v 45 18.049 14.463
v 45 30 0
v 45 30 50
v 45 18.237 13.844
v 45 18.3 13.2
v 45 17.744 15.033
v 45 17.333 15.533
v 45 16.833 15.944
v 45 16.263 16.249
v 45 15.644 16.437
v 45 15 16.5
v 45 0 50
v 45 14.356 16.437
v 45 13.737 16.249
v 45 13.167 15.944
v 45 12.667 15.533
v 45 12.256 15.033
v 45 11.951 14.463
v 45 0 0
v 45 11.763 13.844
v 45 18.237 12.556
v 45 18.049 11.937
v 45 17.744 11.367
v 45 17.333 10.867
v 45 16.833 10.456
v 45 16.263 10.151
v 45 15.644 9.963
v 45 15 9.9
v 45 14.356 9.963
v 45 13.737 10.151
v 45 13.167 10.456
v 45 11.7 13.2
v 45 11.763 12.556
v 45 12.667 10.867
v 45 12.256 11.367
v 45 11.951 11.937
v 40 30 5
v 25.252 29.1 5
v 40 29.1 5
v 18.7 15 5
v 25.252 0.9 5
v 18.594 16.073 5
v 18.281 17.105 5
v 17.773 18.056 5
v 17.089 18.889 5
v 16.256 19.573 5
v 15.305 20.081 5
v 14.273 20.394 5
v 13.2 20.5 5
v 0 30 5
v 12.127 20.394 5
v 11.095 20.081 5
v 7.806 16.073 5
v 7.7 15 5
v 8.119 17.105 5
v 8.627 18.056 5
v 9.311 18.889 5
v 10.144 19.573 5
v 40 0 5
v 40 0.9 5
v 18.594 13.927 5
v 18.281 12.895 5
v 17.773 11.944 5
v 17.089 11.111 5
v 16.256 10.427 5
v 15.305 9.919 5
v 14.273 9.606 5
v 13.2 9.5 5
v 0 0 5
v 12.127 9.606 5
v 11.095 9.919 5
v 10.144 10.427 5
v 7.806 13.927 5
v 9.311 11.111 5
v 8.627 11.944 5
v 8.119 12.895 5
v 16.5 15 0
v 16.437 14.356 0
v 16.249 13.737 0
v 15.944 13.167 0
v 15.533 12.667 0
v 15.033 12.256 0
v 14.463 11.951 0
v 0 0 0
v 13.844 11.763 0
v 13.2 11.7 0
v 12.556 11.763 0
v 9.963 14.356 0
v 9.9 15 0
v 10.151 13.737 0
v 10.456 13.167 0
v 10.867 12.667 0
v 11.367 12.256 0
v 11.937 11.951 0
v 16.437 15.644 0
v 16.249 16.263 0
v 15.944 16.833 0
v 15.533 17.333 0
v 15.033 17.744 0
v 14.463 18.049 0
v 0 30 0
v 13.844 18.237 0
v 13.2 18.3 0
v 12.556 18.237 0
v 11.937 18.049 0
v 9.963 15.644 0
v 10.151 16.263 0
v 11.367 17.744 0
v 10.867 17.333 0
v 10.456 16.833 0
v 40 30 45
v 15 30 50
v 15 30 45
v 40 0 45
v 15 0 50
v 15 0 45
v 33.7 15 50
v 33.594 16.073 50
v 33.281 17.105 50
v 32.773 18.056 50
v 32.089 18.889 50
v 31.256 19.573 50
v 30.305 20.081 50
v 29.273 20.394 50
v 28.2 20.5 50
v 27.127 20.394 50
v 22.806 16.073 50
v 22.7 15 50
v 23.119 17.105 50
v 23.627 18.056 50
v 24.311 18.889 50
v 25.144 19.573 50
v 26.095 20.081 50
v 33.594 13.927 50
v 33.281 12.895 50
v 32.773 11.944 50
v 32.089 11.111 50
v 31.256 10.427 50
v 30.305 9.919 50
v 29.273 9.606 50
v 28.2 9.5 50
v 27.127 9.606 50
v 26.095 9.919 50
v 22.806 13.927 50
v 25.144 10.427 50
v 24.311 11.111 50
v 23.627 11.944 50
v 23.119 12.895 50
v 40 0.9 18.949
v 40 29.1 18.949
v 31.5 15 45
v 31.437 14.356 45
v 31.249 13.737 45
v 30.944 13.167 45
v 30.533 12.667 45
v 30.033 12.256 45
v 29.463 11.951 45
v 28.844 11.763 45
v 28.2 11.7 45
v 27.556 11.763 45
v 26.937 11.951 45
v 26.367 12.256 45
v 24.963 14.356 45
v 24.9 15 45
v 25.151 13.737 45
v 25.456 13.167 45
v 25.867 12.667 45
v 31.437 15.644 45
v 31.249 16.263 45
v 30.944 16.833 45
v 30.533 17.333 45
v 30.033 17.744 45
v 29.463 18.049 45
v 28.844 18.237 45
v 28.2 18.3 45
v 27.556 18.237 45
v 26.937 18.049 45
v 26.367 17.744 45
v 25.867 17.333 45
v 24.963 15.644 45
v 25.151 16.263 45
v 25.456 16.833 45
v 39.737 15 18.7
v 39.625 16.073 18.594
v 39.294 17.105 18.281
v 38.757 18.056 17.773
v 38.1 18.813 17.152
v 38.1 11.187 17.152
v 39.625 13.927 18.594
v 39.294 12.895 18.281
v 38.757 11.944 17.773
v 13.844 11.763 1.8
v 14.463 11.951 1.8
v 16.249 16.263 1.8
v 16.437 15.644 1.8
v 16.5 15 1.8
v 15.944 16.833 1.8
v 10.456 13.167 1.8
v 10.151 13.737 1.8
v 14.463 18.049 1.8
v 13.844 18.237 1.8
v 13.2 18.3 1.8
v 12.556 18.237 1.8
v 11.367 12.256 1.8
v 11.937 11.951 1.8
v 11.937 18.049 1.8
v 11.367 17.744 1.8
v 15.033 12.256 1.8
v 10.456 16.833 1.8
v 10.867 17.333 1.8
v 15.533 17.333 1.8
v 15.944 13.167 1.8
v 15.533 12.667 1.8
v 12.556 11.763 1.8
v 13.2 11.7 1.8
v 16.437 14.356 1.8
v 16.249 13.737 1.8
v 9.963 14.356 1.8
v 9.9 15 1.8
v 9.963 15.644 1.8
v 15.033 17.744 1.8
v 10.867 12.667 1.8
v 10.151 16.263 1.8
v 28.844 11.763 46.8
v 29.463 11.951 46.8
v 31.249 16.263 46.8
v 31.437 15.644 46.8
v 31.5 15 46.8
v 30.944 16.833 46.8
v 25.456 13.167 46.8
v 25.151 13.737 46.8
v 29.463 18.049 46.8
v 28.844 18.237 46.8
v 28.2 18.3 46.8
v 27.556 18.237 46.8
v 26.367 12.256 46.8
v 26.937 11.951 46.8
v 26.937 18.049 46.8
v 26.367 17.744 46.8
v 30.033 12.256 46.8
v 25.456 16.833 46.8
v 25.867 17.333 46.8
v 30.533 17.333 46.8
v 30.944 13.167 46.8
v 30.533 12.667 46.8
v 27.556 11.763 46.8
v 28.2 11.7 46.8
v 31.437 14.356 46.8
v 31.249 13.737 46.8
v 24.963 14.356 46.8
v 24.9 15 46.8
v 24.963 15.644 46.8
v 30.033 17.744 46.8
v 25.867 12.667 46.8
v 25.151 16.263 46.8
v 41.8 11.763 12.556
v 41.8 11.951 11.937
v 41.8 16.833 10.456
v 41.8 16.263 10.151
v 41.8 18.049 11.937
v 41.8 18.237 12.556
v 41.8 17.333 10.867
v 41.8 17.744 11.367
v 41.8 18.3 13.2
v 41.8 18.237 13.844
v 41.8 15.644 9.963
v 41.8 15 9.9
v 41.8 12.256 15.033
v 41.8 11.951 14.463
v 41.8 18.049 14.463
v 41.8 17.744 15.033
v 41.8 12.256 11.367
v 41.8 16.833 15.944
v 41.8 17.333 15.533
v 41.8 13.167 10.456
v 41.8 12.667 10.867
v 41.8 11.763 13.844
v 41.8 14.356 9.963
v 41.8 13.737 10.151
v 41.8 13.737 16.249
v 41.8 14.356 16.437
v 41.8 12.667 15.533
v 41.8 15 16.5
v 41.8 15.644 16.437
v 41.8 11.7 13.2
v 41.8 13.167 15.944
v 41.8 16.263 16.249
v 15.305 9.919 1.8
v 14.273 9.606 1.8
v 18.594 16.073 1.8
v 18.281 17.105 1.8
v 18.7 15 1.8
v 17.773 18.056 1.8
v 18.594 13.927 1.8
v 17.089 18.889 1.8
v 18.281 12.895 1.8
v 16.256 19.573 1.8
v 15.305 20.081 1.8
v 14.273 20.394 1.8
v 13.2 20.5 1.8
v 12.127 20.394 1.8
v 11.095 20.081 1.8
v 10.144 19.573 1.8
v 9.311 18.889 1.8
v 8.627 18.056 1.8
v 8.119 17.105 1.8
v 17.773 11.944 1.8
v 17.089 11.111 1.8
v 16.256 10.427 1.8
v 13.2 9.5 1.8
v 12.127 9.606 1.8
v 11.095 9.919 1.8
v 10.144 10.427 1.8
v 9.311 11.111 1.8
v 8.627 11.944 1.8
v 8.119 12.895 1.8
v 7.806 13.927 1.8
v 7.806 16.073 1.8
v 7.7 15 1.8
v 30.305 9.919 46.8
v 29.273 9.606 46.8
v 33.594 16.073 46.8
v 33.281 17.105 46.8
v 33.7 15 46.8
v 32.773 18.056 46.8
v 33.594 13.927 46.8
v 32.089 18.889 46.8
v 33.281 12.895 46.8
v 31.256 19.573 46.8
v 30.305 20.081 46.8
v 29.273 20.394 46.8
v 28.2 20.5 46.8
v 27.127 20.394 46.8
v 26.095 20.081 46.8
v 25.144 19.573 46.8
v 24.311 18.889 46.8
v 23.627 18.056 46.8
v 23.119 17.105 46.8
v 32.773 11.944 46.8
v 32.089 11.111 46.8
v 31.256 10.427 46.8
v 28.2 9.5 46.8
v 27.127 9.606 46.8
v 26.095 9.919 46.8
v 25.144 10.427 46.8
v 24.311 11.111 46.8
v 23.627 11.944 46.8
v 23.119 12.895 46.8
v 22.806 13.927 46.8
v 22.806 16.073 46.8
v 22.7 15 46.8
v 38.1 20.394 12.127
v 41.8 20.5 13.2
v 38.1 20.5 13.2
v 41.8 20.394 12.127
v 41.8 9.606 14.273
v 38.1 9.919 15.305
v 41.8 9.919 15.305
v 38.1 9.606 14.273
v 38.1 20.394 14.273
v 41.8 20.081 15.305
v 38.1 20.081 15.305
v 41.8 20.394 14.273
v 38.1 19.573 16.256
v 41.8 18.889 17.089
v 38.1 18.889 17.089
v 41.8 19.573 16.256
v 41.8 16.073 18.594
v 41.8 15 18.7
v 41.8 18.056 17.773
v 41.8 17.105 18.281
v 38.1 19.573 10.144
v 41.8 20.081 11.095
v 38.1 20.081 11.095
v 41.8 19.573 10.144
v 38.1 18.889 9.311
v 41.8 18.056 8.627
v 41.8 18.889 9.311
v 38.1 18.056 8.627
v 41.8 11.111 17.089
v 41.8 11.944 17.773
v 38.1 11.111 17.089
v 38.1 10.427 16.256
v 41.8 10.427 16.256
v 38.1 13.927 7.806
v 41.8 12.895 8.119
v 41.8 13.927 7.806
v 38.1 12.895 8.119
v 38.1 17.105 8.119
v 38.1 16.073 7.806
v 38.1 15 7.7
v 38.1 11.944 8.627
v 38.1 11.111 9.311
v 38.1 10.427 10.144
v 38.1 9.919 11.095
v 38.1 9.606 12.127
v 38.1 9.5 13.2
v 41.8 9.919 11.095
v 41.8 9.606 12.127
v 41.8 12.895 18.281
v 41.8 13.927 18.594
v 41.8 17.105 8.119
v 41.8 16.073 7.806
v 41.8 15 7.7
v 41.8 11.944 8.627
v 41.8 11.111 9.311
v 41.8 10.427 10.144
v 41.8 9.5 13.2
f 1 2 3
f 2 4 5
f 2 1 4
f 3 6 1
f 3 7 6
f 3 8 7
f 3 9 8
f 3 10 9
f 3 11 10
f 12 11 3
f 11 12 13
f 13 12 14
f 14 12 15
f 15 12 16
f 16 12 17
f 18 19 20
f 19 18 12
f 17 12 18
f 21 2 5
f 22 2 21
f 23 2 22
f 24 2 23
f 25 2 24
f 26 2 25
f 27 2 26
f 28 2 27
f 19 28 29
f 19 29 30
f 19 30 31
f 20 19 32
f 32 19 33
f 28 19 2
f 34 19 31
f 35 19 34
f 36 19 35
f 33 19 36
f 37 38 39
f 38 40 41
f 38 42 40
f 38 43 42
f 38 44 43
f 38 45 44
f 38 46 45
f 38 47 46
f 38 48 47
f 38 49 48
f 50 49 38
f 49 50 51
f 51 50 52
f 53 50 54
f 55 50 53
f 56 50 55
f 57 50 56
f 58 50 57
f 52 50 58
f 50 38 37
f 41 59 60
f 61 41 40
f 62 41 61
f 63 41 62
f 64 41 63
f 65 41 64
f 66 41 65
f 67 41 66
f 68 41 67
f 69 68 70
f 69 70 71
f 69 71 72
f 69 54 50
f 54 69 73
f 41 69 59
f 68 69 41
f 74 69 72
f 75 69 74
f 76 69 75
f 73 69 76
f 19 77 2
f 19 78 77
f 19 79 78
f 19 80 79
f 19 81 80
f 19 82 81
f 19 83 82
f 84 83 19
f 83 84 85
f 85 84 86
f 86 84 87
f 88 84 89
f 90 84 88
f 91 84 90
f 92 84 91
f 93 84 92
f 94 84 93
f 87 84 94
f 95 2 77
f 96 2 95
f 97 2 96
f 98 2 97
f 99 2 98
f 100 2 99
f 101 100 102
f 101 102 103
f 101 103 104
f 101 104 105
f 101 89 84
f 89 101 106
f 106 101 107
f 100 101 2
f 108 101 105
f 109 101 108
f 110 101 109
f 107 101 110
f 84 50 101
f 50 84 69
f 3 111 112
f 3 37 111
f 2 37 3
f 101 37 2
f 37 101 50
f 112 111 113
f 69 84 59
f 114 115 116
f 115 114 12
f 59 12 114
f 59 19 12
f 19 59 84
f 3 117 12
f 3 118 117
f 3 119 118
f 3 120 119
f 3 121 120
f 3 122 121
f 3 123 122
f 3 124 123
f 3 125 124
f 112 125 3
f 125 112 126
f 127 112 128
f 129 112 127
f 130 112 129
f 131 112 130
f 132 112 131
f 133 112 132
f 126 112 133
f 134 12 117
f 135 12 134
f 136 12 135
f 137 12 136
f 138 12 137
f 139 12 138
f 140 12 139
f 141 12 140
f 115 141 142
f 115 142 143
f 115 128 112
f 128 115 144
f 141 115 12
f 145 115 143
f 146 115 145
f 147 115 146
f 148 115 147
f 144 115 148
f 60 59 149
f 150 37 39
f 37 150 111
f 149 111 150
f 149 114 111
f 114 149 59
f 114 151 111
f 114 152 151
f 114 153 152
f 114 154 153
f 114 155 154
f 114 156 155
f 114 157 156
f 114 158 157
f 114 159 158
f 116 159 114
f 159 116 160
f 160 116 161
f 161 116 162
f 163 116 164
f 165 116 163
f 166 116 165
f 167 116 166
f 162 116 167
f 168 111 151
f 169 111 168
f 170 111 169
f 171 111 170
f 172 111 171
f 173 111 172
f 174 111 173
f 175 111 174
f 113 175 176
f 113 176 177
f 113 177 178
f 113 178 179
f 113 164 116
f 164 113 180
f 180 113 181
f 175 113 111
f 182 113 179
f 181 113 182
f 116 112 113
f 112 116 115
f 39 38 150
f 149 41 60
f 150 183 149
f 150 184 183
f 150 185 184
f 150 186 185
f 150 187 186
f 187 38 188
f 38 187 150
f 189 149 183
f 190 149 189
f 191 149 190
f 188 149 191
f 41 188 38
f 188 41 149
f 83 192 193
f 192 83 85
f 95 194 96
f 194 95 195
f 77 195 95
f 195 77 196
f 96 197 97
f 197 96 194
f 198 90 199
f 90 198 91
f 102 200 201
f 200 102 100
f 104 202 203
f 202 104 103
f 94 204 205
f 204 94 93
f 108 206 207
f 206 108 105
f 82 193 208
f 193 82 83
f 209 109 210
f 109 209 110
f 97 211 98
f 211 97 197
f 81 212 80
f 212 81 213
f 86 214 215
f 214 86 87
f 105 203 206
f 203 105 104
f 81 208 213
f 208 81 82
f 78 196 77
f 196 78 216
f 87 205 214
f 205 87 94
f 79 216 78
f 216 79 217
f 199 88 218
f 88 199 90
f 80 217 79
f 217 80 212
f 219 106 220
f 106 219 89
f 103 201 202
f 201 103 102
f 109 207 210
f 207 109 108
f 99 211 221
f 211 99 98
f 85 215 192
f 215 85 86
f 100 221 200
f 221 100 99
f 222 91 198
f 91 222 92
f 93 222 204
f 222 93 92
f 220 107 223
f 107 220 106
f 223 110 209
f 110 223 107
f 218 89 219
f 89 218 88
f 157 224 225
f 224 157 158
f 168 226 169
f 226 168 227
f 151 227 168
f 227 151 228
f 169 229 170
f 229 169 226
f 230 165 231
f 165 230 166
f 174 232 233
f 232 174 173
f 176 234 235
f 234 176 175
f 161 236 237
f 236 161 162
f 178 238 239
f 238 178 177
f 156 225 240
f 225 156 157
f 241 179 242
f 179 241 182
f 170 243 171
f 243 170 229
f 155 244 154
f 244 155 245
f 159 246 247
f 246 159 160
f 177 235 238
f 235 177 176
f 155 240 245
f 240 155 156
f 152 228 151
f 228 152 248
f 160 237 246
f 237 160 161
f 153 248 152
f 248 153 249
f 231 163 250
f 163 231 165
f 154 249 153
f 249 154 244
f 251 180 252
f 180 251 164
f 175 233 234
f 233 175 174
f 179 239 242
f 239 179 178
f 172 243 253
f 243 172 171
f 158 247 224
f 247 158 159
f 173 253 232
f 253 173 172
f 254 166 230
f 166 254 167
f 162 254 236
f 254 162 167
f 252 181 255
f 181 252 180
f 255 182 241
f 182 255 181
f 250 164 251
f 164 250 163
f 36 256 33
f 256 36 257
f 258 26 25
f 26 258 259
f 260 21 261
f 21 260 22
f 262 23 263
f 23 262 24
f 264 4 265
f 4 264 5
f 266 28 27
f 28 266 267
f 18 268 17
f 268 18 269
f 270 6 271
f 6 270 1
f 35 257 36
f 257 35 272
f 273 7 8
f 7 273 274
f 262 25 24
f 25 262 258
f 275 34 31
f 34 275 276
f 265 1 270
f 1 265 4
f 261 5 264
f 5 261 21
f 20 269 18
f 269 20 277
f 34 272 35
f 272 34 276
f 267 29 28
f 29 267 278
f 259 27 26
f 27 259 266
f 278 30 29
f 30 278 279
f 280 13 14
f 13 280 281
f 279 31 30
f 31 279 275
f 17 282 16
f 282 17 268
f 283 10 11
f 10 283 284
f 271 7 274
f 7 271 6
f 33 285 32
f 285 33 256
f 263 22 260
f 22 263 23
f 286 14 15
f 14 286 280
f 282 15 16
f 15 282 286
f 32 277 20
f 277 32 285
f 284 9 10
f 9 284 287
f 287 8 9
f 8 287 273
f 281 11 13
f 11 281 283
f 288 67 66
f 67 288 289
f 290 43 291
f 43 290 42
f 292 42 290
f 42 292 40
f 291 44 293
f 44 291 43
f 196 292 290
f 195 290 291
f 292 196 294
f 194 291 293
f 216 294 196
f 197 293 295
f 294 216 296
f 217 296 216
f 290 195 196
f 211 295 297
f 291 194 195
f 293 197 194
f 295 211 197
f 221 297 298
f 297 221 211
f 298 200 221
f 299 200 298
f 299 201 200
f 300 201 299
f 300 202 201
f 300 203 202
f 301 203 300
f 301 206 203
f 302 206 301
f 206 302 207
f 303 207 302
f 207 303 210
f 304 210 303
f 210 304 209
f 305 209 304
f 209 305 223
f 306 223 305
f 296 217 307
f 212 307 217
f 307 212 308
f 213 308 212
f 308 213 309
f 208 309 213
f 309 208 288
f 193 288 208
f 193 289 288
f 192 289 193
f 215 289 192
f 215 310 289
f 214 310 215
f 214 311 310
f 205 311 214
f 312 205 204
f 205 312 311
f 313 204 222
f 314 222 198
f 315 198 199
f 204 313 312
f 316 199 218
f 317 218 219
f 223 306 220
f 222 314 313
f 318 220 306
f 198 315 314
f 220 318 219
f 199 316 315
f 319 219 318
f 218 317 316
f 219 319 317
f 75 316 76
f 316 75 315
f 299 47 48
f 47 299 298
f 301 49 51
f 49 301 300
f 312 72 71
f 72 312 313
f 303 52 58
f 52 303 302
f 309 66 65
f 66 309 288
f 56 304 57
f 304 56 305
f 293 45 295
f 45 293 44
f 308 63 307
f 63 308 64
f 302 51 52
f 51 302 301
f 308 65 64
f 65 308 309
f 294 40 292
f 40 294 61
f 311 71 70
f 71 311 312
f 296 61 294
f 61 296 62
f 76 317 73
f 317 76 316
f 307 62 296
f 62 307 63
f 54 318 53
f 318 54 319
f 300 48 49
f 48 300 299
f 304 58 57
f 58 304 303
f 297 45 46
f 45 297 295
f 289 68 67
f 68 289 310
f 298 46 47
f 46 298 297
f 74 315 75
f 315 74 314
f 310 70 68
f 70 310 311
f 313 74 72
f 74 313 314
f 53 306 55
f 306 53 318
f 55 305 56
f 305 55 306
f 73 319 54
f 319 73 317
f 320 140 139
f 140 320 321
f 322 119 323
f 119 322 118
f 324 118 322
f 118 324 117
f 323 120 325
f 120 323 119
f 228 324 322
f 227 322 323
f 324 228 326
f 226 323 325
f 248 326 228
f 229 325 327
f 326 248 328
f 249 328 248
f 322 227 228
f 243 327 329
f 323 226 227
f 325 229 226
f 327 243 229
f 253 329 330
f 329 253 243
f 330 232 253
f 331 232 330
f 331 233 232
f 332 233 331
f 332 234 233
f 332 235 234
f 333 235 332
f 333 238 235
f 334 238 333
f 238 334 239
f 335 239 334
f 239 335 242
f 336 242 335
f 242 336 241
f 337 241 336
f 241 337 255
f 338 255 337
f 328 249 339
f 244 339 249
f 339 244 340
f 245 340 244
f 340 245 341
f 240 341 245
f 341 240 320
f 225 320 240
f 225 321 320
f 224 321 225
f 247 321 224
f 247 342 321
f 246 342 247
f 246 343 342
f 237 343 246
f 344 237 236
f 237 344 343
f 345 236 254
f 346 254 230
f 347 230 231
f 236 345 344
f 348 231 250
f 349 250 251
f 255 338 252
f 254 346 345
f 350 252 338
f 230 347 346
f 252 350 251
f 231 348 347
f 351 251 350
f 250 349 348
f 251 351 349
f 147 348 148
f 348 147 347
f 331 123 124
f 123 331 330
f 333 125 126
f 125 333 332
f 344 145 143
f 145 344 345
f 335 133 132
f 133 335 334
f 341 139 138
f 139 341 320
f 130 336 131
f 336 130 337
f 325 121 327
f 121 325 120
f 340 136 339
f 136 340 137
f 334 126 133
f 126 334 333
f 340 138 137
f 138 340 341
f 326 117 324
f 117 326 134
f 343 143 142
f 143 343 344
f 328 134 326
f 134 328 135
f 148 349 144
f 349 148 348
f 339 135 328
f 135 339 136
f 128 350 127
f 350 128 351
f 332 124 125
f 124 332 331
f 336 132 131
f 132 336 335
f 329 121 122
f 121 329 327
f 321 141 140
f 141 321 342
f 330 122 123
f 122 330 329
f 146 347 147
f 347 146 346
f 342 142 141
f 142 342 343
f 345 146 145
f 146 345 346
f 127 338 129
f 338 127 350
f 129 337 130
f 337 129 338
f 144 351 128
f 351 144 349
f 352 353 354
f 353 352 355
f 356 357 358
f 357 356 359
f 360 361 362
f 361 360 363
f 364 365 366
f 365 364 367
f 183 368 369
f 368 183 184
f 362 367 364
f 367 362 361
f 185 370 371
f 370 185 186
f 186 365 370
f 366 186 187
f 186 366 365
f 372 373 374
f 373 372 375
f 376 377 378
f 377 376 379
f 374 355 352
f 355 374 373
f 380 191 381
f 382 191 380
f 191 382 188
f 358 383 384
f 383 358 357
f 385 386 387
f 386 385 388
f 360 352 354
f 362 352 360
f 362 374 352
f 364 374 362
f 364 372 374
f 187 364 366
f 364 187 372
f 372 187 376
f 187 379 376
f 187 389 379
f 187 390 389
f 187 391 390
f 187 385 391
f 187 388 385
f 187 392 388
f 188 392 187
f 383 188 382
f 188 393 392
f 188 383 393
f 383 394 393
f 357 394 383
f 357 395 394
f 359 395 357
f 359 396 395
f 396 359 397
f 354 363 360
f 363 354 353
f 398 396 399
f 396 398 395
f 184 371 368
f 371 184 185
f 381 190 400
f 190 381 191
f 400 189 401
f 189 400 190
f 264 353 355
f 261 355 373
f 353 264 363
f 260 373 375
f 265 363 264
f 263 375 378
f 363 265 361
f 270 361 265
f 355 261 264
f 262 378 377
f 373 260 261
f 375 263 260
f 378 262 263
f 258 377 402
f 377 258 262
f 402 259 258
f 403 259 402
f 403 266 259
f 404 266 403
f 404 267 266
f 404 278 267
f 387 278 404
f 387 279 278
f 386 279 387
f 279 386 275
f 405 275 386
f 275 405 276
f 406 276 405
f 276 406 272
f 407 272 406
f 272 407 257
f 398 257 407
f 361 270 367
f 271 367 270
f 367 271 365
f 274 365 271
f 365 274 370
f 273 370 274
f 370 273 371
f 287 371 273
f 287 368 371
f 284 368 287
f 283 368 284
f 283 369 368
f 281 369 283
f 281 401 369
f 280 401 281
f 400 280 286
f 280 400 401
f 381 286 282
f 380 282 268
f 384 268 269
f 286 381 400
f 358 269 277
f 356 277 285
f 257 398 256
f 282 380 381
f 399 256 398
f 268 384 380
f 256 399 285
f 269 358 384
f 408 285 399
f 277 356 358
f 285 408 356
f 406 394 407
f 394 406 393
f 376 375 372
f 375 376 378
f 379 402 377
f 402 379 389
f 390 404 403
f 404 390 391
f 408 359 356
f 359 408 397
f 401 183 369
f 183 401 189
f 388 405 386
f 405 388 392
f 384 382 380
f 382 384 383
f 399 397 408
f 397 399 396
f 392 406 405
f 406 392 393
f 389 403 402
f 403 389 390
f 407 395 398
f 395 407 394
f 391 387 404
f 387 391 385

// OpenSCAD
$fn = 32;

// ----------------------------------------------------------------------
// Z-bracket: 45 x 30 x 50 mm
// ----------------------------------------------------------------------

// --- parameters (mm) ---
foot_len = 45;            // lower foot length, X
top_len = 25;             // upper foot length, X
depth = 30;               // bracket width, Y
step_h = 50;              // overall rise, Z
plate_t = 5;              // plate thickness
hole_d = 6.6;             // clearance for M6
cb_d = 11;                // counterbore diameter
cb_h = 3.2;               // counterbore depth
rib_len = 15.7;           // gusset leg
rib_sink = 0.9;           // gusset overlap into the plates

module hole_z(px, py, z0) {
  translate([px, py, z0 - 0.5]) cylinder(h = plate_t + 1, d = hole_d);
}
module hole_x(py, pz) {
  translate([-0.5, py, pz]) rotate([0, 90, 0]) cylinder(h = plate_t + 1, d = hole_d);
}
module cb_z(px, py, top_z) {
  translate([px, py, top_z - cb_h]) cylinder(h = cb_h + 0.5, d = cb_d);
}
module cb_x(py, pz) {
  translate([plate_t - cb_h, py, pz]) rotate([0, -90, 0]) cylinder(h = cb_h + 0.5, d = cb_d);
}
module gusset(x0) {
  translate([x0, depth - rib_sink, 0])
    rotate([90, 0, 0])
      linear_extrude(height = depth - 2 * rib_sink)
        polygon(points = [[rib_sink, plate_t - rib_sink],
                          [rib_sink, plate_t - rib_sink + rib_len],
                          [-rib_len, plate_t - rib_sink]]);
}

difference() {
  union() {
    cube([foot_len, depth, plate_t]);
    /* web, overlapping the lower foot */
    translate([foot_len - plate_t, 0, 0]) cube([plate_t, depth, step_h]);
    /* upper foot, sunk into the web */
    translate([foot_len - plate_t - top_len, 0, step_h - plate_t]) cube([top_len + plate_t, depth, plate_t]);
    gusset(foot_len - plate_t);
  }
  hole_z(13.2, 15, 0);
  translate([foot_len - plate_t - 11.8, 0, 0]) hole_z(0, 15, step_h - plate_t);
  translate([foot_len - plate_t, 0, 0]) hole_x(15, 13.2);
  cb_z(13.2, 15, plate_t);
  translate([foot_len - plate_t - 11.8, 0, 0]) cb_z(0, 15, step_h);
  translate([foot_len - plate_t, 0, 0]) cb_x(15, 13.2);
}
